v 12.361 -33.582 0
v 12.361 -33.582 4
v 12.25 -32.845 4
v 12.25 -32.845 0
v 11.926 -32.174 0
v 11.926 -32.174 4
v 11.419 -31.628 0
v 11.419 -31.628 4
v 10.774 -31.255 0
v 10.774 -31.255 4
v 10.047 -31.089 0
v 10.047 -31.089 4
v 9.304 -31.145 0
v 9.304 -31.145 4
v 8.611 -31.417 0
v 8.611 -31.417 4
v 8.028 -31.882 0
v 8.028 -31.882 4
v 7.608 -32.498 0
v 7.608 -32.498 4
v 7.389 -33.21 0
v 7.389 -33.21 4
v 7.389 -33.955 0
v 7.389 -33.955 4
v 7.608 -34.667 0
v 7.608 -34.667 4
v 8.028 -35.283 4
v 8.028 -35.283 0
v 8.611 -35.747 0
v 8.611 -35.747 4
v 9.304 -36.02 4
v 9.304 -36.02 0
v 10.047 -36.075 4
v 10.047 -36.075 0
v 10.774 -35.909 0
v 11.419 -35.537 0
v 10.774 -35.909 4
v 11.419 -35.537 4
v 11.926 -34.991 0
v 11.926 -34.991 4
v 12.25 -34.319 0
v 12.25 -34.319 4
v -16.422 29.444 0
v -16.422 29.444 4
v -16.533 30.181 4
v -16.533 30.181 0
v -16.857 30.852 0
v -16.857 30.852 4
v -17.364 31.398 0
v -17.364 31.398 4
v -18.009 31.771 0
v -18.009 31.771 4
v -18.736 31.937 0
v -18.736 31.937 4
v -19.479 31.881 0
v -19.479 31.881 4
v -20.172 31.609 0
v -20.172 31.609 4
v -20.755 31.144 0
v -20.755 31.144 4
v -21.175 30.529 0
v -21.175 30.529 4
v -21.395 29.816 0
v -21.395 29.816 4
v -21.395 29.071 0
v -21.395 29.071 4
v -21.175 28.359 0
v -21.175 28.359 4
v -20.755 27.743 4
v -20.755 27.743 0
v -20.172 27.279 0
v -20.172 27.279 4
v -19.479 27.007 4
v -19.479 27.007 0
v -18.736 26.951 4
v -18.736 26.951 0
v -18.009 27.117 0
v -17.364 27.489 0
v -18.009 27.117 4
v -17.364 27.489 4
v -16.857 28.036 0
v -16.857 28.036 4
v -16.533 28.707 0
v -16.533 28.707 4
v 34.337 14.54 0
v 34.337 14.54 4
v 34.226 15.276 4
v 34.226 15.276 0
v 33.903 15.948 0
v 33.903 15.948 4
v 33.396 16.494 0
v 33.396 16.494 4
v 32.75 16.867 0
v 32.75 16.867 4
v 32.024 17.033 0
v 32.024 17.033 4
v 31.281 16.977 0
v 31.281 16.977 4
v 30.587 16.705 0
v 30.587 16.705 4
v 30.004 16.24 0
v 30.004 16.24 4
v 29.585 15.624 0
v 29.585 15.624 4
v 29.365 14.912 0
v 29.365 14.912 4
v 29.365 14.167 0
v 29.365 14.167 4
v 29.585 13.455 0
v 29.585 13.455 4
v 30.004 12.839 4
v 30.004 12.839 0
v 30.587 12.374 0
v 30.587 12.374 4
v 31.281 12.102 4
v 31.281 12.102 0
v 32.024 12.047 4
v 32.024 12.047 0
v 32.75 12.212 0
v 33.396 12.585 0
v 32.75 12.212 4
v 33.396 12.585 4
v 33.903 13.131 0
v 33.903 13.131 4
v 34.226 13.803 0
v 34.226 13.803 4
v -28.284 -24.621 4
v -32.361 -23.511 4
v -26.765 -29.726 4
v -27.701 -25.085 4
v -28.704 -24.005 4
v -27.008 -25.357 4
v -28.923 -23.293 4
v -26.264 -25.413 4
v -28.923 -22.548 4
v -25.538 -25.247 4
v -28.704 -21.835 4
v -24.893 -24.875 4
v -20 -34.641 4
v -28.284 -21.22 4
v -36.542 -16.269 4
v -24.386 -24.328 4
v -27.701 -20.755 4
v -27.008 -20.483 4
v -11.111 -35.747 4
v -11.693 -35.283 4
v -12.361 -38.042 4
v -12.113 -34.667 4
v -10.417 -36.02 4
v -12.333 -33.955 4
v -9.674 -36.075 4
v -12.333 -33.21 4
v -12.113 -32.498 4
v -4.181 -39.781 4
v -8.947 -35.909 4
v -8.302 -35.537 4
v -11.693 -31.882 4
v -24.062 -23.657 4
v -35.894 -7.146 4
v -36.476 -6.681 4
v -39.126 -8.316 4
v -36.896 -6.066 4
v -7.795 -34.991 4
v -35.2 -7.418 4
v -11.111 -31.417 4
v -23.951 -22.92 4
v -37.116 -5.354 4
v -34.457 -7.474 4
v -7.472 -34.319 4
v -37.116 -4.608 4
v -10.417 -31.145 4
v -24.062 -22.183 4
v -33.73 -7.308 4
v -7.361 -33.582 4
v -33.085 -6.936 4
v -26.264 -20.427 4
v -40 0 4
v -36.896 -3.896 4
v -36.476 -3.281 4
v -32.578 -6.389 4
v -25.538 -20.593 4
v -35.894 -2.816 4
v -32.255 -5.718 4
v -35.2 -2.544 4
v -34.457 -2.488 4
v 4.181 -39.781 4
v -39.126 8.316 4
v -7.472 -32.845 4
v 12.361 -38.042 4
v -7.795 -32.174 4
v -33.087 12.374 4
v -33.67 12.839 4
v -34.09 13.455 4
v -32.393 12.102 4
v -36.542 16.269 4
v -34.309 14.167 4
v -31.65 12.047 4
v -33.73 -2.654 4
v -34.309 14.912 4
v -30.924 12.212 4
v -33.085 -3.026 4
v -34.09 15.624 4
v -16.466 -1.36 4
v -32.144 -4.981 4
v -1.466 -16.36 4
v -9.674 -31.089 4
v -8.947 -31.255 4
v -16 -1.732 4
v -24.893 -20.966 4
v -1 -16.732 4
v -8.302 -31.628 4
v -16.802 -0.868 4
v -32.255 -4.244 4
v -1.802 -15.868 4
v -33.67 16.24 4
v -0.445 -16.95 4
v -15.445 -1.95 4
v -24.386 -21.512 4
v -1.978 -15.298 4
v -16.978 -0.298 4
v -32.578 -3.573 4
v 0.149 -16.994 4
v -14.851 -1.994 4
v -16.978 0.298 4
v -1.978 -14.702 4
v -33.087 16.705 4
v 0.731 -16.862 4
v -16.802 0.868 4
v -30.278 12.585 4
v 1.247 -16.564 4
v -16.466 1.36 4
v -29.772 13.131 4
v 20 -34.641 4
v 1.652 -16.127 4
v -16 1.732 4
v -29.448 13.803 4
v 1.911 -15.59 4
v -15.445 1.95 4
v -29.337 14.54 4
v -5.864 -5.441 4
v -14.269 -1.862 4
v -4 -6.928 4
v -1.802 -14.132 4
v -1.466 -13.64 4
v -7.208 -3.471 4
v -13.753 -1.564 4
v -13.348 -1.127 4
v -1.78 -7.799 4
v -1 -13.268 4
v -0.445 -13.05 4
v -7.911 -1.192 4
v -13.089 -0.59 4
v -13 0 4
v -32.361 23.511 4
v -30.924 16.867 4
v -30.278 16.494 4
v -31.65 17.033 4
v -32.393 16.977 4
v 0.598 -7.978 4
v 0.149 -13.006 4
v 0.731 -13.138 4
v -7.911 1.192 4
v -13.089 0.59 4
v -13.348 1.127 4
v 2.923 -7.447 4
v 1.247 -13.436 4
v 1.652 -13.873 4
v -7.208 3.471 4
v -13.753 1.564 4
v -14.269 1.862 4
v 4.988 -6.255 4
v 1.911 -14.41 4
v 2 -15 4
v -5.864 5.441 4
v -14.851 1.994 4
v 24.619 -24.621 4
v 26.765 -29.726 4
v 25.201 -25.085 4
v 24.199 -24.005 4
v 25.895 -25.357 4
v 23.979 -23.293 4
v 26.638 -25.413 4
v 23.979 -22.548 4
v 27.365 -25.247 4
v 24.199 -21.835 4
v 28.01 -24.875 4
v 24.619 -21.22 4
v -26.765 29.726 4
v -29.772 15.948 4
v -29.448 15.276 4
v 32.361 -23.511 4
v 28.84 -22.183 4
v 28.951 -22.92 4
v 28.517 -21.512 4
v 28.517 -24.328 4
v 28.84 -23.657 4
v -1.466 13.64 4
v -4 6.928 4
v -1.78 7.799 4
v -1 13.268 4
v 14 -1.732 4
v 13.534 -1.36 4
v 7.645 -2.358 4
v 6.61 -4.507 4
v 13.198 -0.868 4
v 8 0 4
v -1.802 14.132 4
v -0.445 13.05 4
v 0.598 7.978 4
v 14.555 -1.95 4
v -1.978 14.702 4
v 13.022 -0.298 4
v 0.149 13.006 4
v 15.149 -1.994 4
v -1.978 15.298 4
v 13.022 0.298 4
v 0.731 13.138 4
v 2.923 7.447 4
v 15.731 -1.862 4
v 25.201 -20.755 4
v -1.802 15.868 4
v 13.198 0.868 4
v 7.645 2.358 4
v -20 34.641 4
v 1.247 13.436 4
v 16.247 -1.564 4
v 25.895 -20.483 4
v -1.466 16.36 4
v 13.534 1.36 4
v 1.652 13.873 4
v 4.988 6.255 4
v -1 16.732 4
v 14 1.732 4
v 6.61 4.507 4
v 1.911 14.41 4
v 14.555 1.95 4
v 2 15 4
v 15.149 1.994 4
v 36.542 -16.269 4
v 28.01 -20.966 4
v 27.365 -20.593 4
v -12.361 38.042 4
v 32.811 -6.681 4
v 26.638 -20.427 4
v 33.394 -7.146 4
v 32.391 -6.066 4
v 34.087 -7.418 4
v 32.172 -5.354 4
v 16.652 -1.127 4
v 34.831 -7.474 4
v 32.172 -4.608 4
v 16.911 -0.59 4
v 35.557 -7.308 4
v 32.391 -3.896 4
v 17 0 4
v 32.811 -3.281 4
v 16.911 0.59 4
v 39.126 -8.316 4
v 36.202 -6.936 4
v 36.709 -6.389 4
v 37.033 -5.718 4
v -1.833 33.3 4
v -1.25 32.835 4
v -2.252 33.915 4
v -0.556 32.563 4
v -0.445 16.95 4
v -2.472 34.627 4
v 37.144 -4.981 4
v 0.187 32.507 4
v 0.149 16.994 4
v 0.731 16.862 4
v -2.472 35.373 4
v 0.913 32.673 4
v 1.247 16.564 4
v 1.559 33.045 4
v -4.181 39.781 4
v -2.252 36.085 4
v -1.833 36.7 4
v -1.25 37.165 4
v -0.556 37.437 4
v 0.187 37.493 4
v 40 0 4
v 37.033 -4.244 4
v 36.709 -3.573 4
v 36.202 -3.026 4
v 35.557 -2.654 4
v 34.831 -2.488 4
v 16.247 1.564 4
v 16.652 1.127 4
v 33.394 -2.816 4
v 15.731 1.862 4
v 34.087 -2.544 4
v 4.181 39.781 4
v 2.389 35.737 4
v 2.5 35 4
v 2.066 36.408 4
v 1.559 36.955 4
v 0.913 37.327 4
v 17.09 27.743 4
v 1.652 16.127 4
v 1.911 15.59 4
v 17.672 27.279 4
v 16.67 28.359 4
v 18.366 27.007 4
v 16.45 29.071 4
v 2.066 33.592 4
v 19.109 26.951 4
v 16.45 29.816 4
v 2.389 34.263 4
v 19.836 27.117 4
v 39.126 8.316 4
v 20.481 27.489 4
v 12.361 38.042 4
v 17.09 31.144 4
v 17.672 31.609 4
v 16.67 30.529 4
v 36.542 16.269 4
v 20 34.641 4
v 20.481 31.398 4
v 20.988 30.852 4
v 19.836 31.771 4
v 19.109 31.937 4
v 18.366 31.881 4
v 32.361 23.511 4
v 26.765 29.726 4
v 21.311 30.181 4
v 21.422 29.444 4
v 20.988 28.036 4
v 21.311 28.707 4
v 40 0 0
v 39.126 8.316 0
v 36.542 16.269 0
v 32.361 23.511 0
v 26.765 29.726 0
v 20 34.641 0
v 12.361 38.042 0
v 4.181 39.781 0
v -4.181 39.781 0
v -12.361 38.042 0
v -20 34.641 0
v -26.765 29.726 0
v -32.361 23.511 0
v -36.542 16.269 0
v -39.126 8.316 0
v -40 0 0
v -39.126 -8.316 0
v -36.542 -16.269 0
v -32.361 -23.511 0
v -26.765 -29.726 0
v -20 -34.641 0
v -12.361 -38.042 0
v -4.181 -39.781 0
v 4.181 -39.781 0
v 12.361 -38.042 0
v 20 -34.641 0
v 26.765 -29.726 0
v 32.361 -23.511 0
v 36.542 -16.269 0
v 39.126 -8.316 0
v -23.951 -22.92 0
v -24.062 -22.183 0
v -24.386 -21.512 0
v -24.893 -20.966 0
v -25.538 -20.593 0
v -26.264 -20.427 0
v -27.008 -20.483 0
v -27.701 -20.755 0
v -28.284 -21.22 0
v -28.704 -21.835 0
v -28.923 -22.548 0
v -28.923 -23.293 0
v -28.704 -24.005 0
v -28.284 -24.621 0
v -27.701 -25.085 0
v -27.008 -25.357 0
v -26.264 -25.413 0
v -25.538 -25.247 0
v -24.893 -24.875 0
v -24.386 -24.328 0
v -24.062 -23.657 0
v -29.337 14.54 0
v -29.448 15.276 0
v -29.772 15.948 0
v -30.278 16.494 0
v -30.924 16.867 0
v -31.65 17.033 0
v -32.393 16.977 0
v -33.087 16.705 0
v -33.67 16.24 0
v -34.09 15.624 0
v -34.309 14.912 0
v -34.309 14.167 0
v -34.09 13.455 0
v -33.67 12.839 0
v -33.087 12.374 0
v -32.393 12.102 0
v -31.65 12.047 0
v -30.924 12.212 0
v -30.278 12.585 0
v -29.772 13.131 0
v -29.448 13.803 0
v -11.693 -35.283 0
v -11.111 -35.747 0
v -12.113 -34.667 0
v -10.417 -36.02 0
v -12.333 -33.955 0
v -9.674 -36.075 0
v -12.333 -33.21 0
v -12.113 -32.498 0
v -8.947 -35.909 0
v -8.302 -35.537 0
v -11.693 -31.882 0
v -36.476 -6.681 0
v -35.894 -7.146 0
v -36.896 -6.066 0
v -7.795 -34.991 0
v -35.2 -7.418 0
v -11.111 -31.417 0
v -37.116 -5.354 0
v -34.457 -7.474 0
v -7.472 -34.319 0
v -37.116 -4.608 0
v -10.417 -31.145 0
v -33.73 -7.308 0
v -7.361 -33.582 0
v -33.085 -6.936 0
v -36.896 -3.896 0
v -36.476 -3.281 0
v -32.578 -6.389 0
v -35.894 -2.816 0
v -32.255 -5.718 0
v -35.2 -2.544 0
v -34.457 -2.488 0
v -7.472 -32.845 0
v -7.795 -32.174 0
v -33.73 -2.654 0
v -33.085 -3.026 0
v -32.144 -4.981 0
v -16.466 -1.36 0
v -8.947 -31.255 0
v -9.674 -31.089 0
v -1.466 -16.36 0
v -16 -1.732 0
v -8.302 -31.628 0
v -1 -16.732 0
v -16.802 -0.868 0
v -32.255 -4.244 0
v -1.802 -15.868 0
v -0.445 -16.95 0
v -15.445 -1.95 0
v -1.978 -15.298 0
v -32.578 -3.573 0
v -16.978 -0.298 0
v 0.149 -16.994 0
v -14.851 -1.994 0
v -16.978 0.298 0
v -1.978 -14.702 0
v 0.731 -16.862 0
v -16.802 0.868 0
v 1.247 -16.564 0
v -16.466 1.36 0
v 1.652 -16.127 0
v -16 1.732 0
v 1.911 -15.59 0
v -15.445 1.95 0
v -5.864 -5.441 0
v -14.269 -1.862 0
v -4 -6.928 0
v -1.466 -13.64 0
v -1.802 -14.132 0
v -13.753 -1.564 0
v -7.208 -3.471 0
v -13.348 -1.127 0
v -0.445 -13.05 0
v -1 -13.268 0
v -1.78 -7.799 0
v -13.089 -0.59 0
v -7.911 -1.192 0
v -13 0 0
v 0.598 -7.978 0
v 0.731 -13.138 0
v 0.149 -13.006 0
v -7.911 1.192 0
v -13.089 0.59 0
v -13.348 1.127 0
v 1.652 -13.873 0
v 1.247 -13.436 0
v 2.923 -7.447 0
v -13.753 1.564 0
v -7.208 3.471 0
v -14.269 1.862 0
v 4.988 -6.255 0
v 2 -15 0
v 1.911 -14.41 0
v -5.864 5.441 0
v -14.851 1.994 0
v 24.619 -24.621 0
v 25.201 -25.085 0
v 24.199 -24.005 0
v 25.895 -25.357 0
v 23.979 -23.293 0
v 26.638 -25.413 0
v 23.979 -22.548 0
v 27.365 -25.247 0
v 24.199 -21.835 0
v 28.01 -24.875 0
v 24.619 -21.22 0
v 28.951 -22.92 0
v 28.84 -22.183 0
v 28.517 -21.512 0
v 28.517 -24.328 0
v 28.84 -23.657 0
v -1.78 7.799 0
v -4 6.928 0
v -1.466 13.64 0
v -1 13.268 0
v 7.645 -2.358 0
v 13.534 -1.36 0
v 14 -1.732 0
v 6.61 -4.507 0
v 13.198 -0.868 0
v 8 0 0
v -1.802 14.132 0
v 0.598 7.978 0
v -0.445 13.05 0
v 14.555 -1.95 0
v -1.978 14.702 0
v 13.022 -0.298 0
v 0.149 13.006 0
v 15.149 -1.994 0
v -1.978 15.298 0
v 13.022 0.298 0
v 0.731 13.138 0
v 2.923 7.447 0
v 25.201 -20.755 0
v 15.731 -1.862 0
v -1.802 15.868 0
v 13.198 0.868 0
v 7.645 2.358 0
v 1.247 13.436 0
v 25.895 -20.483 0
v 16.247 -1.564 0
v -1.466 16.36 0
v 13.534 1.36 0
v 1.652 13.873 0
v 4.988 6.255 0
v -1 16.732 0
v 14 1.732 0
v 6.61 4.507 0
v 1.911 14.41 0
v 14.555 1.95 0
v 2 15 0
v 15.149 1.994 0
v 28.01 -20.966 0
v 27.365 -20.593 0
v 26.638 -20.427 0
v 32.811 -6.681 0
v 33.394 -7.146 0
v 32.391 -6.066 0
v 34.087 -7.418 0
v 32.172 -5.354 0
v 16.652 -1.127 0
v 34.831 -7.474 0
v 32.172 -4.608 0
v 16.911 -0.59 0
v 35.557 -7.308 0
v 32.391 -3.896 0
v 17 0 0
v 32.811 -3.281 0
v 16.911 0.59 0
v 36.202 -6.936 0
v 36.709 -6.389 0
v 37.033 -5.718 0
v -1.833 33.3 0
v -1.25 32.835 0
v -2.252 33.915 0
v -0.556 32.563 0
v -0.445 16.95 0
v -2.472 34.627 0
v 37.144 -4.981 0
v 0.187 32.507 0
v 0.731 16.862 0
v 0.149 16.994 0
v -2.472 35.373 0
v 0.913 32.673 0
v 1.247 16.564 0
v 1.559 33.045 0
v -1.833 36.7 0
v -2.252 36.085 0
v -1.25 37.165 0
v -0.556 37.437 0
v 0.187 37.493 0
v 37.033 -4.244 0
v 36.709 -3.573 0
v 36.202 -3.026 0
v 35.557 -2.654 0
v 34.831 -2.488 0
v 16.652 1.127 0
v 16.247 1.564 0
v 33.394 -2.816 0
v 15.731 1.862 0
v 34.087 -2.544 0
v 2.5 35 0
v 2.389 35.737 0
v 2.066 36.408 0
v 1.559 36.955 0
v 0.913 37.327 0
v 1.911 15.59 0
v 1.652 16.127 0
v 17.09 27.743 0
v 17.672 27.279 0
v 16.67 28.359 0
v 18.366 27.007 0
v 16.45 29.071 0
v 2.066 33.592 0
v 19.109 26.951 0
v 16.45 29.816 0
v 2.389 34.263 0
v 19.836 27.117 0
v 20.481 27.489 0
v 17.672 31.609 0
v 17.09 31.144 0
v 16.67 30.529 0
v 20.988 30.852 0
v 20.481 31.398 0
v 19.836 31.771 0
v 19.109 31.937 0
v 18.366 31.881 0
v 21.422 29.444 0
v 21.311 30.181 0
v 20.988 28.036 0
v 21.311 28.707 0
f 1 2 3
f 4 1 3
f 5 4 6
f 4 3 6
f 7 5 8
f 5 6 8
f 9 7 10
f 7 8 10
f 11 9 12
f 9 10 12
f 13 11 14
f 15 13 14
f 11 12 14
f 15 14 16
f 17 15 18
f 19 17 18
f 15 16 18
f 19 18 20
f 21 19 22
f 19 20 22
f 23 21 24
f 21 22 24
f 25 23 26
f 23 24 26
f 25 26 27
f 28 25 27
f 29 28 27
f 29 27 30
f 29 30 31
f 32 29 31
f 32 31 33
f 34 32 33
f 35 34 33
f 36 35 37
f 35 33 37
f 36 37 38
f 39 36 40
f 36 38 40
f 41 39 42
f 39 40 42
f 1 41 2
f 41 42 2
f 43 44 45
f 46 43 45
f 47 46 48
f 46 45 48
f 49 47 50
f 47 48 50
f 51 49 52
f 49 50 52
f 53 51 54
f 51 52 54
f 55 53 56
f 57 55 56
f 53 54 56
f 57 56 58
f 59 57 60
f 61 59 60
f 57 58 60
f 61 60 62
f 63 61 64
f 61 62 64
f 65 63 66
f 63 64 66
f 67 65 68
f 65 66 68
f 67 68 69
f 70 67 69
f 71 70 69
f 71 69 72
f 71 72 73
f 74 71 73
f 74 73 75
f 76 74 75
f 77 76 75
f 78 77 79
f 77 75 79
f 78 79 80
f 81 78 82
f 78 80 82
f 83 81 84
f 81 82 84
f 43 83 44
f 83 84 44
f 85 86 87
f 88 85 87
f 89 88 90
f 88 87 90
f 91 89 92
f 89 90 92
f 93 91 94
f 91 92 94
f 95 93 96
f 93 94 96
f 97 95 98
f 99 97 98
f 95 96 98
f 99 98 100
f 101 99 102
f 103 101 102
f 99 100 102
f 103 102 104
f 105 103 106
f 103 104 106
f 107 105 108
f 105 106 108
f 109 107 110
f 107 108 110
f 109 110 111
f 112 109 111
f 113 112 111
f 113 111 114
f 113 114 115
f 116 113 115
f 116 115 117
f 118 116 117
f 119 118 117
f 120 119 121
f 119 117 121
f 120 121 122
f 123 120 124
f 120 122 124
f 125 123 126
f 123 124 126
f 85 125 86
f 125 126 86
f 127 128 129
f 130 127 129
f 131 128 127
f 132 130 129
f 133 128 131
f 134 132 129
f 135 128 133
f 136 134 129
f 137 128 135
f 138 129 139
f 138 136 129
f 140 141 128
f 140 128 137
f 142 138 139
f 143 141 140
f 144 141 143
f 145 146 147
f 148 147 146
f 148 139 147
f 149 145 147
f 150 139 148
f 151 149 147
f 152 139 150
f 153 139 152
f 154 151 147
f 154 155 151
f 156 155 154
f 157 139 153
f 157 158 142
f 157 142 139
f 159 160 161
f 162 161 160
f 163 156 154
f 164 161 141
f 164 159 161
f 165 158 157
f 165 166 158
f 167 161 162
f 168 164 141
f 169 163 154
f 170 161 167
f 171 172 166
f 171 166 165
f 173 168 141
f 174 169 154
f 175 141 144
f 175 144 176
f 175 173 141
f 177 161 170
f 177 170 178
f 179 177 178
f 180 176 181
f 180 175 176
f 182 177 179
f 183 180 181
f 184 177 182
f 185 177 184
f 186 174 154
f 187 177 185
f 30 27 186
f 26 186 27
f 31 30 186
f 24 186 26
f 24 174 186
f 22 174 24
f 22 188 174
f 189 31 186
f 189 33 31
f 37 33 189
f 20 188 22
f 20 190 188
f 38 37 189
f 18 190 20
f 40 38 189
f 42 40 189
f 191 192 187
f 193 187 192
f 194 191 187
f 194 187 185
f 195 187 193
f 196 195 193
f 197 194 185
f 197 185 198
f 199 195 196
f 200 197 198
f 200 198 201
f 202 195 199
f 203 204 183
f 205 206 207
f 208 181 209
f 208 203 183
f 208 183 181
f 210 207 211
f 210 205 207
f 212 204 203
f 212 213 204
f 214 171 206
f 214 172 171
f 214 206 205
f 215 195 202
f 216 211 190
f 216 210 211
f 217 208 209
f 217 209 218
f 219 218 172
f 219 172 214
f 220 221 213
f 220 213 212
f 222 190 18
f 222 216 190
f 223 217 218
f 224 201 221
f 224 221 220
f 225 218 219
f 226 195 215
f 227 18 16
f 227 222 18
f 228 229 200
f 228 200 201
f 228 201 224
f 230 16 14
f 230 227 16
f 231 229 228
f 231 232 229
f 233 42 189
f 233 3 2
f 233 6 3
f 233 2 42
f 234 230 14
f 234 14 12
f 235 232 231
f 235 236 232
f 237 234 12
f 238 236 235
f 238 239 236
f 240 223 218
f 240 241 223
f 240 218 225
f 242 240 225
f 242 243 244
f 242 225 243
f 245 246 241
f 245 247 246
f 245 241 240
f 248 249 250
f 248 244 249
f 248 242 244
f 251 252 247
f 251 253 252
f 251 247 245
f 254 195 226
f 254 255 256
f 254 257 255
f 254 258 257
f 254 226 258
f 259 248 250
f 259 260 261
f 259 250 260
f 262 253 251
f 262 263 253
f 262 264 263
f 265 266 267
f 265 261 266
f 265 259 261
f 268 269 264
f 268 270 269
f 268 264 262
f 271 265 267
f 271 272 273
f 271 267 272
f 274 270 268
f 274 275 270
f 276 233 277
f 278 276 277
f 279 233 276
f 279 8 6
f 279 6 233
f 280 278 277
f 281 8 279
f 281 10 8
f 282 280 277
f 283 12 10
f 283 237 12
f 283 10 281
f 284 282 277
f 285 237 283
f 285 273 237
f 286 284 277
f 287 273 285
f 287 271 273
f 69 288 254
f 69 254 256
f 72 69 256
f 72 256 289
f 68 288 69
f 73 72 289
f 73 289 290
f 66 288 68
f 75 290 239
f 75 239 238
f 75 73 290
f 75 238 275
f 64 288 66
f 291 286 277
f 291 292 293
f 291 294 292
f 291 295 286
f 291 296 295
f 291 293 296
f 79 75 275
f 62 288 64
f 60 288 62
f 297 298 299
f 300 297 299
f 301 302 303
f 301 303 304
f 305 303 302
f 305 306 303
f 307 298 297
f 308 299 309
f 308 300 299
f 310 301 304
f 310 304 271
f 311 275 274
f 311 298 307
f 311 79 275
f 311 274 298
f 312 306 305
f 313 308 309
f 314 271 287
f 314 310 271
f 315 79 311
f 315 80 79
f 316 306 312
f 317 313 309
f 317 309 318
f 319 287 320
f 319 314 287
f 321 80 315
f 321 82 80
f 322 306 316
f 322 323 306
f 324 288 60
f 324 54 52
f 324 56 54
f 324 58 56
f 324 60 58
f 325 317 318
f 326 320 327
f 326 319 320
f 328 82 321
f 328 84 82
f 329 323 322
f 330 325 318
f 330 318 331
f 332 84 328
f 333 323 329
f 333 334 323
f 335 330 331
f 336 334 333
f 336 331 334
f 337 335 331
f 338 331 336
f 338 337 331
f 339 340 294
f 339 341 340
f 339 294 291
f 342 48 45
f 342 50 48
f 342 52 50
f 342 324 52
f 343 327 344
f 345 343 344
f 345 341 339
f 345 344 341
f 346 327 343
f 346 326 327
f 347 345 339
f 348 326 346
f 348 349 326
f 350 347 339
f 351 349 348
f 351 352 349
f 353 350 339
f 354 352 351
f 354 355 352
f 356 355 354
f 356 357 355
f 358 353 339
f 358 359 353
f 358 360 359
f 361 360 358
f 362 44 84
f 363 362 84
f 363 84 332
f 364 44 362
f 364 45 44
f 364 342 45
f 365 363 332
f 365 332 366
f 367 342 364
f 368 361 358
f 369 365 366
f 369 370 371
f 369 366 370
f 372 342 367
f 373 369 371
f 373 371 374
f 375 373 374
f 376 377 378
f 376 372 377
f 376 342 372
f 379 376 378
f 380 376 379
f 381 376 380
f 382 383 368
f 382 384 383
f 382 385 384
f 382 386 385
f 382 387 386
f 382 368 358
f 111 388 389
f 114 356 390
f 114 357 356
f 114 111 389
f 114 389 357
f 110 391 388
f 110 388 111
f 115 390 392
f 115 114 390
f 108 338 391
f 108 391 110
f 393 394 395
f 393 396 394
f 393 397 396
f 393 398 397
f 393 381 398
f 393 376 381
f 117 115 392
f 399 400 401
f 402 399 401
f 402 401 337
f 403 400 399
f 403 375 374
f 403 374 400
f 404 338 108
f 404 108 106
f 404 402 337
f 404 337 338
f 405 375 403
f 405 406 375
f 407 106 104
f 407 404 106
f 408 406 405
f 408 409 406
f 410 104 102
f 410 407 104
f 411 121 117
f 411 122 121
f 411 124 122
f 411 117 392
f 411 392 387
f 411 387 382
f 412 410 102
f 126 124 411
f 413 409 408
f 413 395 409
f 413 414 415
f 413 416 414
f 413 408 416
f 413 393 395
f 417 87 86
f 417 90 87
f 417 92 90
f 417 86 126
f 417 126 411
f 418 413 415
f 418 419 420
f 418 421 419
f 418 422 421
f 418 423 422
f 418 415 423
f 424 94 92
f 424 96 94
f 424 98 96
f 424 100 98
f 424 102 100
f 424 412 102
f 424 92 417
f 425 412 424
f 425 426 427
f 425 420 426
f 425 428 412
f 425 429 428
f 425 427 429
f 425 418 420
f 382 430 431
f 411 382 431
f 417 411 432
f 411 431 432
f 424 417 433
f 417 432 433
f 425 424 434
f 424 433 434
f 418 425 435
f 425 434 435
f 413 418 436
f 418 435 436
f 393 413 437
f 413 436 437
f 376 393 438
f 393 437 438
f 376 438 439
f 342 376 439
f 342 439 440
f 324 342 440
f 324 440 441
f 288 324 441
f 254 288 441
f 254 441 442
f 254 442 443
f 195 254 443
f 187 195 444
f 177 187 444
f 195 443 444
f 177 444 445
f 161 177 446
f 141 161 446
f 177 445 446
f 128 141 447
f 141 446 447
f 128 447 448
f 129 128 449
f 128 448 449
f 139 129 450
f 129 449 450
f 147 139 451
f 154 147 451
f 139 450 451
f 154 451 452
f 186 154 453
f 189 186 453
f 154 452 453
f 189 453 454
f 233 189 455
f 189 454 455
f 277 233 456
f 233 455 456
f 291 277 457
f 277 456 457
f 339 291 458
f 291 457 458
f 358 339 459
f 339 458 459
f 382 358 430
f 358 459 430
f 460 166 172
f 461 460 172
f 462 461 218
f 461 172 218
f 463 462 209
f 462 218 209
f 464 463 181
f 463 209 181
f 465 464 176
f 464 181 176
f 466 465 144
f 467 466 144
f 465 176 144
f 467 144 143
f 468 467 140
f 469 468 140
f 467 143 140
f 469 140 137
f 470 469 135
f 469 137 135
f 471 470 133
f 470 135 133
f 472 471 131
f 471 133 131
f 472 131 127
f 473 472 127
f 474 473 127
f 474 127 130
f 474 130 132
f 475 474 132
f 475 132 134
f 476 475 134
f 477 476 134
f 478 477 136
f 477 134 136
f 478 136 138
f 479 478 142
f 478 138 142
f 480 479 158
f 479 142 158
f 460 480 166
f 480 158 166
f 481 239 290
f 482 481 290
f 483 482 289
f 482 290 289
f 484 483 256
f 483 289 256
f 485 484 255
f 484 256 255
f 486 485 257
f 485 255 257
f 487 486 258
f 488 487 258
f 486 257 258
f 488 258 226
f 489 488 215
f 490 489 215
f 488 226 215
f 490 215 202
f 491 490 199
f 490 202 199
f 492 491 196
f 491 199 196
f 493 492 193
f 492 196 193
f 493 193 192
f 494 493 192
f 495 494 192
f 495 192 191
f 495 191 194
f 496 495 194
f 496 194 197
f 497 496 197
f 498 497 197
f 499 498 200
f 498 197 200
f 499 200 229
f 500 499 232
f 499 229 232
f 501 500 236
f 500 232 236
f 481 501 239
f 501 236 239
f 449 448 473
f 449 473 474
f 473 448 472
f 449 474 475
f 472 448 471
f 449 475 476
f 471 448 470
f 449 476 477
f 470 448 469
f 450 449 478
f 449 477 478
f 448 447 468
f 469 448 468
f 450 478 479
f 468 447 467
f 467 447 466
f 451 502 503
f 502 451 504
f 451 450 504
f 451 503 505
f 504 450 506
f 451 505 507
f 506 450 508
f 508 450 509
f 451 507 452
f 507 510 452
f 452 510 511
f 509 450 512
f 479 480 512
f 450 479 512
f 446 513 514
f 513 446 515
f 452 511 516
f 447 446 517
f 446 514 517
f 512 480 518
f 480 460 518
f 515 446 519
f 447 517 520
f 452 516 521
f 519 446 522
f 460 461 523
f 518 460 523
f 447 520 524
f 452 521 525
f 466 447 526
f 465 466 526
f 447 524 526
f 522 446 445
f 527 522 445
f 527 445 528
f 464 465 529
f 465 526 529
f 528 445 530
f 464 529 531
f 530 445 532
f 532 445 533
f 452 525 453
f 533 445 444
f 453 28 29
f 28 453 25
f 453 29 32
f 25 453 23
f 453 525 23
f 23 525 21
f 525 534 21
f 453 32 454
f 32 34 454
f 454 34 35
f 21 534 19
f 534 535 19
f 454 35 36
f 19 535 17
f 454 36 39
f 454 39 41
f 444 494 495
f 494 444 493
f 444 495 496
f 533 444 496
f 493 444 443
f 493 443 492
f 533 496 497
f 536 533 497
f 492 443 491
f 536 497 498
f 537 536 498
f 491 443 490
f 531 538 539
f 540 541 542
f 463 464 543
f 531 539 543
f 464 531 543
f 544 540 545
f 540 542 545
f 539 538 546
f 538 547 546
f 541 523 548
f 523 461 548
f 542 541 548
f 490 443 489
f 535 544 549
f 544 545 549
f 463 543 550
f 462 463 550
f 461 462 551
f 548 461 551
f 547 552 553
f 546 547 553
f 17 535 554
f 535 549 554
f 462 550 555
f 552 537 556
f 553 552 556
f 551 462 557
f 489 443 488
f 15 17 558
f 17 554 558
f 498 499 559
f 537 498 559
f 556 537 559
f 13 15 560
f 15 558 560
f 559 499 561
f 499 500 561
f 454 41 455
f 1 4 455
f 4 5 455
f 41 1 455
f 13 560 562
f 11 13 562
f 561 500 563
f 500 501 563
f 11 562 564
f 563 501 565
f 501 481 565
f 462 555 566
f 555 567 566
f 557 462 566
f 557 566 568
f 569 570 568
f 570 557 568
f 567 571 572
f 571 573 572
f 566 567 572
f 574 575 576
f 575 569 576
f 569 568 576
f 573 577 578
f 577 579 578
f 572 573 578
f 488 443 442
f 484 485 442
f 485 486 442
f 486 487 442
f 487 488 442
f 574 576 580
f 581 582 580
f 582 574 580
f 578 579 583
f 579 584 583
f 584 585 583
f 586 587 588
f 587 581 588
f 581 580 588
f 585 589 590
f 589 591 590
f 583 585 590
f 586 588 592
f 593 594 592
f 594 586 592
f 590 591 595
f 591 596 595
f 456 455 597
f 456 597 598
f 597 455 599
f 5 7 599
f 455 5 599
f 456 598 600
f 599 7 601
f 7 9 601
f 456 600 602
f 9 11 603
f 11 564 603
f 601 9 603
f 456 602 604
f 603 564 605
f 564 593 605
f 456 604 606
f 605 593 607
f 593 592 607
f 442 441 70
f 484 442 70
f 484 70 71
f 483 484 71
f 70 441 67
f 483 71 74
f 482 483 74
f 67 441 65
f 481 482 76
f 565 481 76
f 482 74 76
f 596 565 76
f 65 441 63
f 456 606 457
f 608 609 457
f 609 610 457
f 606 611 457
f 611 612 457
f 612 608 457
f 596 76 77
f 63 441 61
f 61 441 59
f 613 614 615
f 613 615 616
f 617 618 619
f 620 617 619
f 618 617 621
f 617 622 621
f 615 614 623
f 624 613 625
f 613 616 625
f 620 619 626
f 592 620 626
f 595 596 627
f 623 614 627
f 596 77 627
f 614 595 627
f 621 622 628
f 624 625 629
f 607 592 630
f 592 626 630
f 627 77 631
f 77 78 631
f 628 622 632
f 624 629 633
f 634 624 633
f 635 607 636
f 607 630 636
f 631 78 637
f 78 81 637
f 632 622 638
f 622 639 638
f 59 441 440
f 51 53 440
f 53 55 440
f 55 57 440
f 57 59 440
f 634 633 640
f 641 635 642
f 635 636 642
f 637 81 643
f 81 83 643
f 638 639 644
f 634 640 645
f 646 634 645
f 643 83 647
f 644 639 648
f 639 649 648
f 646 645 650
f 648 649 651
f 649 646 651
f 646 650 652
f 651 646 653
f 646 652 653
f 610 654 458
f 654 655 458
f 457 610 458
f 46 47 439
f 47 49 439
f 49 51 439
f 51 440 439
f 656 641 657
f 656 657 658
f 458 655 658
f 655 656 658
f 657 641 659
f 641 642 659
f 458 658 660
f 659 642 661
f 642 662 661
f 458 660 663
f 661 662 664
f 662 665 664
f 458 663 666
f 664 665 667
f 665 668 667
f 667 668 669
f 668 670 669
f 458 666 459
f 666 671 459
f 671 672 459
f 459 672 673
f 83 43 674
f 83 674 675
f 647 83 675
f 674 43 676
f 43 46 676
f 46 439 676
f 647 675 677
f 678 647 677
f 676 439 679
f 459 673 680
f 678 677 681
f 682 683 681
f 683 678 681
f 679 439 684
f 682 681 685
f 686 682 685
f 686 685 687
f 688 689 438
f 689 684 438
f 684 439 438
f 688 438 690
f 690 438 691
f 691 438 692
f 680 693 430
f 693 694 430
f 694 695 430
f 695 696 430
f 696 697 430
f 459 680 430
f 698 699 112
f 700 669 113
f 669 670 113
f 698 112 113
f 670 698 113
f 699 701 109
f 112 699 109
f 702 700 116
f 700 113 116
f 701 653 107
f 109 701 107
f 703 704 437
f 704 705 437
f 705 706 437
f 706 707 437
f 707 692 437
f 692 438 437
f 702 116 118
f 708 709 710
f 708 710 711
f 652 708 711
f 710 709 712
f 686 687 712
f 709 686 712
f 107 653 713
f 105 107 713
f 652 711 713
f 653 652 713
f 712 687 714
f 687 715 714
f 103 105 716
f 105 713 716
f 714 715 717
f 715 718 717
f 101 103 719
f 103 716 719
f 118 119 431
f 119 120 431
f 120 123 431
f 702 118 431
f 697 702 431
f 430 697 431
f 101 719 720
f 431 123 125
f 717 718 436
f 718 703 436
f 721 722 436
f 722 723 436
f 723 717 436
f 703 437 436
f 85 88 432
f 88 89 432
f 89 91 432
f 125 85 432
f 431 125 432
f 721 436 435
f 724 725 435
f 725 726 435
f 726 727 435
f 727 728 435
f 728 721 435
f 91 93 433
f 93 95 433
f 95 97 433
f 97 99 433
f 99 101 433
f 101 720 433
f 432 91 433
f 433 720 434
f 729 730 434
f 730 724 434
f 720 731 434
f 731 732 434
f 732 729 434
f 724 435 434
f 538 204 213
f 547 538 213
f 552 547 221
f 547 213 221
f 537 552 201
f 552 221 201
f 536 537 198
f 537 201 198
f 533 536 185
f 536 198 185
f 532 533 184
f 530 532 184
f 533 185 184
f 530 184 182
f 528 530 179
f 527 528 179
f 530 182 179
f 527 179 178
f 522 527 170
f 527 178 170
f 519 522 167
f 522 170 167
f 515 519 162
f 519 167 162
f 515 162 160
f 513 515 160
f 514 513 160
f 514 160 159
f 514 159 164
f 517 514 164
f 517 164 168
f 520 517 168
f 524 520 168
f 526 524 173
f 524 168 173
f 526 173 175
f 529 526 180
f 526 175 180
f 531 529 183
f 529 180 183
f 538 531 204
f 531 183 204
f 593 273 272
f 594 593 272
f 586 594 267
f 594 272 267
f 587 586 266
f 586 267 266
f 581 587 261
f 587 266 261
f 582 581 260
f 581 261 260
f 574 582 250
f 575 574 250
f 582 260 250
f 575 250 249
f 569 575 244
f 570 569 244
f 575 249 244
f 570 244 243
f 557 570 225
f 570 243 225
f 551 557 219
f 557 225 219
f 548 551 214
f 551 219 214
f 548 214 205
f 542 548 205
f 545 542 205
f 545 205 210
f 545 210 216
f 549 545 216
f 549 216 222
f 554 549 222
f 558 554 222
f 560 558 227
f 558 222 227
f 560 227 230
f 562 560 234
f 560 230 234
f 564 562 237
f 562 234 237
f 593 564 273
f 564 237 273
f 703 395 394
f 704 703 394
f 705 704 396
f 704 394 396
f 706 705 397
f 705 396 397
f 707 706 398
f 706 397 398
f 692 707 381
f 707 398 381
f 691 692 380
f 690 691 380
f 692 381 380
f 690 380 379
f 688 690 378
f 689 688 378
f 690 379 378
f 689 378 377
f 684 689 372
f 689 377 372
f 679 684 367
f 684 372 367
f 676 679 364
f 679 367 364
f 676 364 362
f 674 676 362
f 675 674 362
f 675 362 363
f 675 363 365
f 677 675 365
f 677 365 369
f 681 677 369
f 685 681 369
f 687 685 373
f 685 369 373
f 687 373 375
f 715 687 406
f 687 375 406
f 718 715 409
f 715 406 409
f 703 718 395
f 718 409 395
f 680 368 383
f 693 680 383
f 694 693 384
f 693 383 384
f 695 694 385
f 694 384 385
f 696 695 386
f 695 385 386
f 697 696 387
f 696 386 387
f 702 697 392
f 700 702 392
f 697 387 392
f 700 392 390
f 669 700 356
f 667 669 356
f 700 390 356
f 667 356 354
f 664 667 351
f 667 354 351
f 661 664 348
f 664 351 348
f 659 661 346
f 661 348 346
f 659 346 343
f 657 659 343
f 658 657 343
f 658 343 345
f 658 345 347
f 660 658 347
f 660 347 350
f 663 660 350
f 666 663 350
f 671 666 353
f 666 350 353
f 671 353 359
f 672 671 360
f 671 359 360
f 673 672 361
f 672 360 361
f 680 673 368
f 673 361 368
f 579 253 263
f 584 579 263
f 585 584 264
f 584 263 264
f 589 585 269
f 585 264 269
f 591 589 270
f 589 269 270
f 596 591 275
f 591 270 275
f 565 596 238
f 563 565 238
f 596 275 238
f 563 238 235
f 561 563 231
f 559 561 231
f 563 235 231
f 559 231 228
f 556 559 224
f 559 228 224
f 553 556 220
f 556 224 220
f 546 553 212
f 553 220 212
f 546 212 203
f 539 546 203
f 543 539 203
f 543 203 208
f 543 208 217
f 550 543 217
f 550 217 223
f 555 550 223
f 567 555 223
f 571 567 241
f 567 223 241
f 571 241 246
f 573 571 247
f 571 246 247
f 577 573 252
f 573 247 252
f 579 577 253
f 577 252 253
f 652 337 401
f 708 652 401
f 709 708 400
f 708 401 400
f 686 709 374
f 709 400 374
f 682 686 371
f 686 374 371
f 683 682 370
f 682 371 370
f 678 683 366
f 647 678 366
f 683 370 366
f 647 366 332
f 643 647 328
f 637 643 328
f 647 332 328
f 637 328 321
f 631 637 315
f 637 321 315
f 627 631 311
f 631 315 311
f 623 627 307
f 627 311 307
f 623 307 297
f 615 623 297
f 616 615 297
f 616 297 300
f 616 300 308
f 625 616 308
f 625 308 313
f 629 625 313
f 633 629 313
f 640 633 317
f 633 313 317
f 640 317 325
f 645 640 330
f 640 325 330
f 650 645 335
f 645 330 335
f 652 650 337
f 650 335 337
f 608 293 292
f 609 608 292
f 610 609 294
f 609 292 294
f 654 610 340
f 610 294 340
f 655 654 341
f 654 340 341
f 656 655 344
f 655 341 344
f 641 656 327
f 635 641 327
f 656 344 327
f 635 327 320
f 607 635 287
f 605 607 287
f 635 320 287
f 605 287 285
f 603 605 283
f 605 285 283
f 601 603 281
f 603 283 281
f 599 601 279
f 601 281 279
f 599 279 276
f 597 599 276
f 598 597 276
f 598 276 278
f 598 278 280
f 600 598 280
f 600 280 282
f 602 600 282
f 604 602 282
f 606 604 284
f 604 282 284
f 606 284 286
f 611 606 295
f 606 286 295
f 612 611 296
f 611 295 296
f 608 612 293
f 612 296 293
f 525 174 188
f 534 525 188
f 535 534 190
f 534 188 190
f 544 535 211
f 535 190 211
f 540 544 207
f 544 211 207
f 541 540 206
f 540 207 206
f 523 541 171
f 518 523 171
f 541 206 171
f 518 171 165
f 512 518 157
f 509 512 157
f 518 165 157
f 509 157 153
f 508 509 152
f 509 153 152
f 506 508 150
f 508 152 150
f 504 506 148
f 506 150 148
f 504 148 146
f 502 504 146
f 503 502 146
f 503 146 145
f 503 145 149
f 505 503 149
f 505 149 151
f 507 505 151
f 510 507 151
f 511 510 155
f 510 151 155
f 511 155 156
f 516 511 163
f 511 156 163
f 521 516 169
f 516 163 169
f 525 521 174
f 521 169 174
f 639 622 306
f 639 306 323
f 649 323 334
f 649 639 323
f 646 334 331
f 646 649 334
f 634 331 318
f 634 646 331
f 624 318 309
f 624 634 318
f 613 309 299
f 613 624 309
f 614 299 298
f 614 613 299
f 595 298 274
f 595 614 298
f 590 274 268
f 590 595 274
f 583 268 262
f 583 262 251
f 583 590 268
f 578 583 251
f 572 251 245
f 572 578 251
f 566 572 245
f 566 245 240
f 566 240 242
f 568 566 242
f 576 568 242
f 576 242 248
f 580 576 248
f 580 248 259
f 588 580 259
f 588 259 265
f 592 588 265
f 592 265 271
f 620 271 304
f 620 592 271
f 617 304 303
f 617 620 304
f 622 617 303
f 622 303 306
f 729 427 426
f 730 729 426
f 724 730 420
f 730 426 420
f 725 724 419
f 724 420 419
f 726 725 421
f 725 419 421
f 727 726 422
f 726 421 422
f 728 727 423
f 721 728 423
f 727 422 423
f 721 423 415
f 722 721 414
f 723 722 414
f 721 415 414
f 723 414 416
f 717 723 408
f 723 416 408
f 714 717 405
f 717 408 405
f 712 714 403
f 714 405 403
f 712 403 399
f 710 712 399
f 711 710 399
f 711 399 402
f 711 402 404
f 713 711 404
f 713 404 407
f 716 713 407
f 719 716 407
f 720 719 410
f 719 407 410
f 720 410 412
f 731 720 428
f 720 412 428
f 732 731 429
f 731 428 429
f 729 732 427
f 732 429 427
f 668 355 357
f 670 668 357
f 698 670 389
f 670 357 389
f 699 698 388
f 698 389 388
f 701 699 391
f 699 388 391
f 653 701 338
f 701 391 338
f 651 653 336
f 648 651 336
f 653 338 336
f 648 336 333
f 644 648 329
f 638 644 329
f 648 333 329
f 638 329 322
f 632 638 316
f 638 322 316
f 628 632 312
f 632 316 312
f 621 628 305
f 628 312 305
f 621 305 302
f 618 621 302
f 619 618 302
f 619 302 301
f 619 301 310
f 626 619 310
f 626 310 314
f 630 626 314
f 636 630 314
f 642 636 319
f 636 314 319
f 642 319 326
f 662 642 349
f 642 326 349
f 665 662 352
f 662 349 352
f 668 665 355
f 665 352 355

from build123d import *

# Parameters (mm, degrees)
SKETCH1_R           = 40
SKETCH1_R_2         = 8
BOSS_EXTRUDE1_DEPTH = 4
SKETCH2_R           = 2.5
CUT_EXTRUDE1_DEPTH  = 4
SKETCH3_R           = 2
CUT_EXTRUDE2_DEPTH  = 4


with BuildPart() as part:
    # Sketch1 → Boss-Extrude1 (new body)
    with BuildSketch(Plane.XY):
        Circle(SKETCH1_R)
        Circle(SKETCH1_R_2, mode=Mode.SUBTRACT)
    extrude(amount=BOSS_EXTRUDE1_DEPTH)

    # Sketch2 → Cut-Extrude1 (cut)
    with BuildSketch(Plane.XY.offset(4)):
        with Locations((0, 35)):
            Circle(SKETCH2_R)
        with Locations((18.922428611, 29.443873649)):
            Circle(SKETCH2_R)
        with Locations((31.837119837, 14.539525455)):
            Circle(SKETCH2_R)
        with Locations((34.643750466, -4.98101934)):
            Circle(SKETCH2_R)
        with Locations((26.451235102, -22.920125688)):
            Circle(SKETCH2_R)
        with Locations((9.860639489, -33.582254077)):
            Circle(SKETCH2_R)
        with Locations((-9.860639489, -33.582254077)):
            Circle(SKETCH2_R)
        with Locations((-26.451235102, -22.920125688)):
            Circle(SKETCH2_R)
        with Locations((-34.643750466, -4.98101934)):
            Circle(SKETCH2_R)
        with Locations((-31.837119837, 14.539525455)):
            Circle(SKETCH2_R)
        with Locations((-18.922428611, 29.443873649)):
            Circle(SKETCH2_R)
    extrude(amount=-CUT_EXTRUDE1_DEPTH, mode=Mode.SUBTRACT)

    # Sketch3 → Cut-Extrude2 (cut)
    with BuildSketch(Plane.XY.offset(4)):
        with Locations((0, 15)):
            Circle(SKETCH3_R)
        with Locations((15, 0)):
            Circle(SKETCH3_R)
        with Locations((0, -15)):
            Circle(SKETCH3_R)
        with Locations((-15, 0)):
            Circle(SKETCH3_R)
    extrude(amount=-CUT_EXTRUDE2_DEPTH, mode=Mode.SUBTRACT)


solid = part.part
